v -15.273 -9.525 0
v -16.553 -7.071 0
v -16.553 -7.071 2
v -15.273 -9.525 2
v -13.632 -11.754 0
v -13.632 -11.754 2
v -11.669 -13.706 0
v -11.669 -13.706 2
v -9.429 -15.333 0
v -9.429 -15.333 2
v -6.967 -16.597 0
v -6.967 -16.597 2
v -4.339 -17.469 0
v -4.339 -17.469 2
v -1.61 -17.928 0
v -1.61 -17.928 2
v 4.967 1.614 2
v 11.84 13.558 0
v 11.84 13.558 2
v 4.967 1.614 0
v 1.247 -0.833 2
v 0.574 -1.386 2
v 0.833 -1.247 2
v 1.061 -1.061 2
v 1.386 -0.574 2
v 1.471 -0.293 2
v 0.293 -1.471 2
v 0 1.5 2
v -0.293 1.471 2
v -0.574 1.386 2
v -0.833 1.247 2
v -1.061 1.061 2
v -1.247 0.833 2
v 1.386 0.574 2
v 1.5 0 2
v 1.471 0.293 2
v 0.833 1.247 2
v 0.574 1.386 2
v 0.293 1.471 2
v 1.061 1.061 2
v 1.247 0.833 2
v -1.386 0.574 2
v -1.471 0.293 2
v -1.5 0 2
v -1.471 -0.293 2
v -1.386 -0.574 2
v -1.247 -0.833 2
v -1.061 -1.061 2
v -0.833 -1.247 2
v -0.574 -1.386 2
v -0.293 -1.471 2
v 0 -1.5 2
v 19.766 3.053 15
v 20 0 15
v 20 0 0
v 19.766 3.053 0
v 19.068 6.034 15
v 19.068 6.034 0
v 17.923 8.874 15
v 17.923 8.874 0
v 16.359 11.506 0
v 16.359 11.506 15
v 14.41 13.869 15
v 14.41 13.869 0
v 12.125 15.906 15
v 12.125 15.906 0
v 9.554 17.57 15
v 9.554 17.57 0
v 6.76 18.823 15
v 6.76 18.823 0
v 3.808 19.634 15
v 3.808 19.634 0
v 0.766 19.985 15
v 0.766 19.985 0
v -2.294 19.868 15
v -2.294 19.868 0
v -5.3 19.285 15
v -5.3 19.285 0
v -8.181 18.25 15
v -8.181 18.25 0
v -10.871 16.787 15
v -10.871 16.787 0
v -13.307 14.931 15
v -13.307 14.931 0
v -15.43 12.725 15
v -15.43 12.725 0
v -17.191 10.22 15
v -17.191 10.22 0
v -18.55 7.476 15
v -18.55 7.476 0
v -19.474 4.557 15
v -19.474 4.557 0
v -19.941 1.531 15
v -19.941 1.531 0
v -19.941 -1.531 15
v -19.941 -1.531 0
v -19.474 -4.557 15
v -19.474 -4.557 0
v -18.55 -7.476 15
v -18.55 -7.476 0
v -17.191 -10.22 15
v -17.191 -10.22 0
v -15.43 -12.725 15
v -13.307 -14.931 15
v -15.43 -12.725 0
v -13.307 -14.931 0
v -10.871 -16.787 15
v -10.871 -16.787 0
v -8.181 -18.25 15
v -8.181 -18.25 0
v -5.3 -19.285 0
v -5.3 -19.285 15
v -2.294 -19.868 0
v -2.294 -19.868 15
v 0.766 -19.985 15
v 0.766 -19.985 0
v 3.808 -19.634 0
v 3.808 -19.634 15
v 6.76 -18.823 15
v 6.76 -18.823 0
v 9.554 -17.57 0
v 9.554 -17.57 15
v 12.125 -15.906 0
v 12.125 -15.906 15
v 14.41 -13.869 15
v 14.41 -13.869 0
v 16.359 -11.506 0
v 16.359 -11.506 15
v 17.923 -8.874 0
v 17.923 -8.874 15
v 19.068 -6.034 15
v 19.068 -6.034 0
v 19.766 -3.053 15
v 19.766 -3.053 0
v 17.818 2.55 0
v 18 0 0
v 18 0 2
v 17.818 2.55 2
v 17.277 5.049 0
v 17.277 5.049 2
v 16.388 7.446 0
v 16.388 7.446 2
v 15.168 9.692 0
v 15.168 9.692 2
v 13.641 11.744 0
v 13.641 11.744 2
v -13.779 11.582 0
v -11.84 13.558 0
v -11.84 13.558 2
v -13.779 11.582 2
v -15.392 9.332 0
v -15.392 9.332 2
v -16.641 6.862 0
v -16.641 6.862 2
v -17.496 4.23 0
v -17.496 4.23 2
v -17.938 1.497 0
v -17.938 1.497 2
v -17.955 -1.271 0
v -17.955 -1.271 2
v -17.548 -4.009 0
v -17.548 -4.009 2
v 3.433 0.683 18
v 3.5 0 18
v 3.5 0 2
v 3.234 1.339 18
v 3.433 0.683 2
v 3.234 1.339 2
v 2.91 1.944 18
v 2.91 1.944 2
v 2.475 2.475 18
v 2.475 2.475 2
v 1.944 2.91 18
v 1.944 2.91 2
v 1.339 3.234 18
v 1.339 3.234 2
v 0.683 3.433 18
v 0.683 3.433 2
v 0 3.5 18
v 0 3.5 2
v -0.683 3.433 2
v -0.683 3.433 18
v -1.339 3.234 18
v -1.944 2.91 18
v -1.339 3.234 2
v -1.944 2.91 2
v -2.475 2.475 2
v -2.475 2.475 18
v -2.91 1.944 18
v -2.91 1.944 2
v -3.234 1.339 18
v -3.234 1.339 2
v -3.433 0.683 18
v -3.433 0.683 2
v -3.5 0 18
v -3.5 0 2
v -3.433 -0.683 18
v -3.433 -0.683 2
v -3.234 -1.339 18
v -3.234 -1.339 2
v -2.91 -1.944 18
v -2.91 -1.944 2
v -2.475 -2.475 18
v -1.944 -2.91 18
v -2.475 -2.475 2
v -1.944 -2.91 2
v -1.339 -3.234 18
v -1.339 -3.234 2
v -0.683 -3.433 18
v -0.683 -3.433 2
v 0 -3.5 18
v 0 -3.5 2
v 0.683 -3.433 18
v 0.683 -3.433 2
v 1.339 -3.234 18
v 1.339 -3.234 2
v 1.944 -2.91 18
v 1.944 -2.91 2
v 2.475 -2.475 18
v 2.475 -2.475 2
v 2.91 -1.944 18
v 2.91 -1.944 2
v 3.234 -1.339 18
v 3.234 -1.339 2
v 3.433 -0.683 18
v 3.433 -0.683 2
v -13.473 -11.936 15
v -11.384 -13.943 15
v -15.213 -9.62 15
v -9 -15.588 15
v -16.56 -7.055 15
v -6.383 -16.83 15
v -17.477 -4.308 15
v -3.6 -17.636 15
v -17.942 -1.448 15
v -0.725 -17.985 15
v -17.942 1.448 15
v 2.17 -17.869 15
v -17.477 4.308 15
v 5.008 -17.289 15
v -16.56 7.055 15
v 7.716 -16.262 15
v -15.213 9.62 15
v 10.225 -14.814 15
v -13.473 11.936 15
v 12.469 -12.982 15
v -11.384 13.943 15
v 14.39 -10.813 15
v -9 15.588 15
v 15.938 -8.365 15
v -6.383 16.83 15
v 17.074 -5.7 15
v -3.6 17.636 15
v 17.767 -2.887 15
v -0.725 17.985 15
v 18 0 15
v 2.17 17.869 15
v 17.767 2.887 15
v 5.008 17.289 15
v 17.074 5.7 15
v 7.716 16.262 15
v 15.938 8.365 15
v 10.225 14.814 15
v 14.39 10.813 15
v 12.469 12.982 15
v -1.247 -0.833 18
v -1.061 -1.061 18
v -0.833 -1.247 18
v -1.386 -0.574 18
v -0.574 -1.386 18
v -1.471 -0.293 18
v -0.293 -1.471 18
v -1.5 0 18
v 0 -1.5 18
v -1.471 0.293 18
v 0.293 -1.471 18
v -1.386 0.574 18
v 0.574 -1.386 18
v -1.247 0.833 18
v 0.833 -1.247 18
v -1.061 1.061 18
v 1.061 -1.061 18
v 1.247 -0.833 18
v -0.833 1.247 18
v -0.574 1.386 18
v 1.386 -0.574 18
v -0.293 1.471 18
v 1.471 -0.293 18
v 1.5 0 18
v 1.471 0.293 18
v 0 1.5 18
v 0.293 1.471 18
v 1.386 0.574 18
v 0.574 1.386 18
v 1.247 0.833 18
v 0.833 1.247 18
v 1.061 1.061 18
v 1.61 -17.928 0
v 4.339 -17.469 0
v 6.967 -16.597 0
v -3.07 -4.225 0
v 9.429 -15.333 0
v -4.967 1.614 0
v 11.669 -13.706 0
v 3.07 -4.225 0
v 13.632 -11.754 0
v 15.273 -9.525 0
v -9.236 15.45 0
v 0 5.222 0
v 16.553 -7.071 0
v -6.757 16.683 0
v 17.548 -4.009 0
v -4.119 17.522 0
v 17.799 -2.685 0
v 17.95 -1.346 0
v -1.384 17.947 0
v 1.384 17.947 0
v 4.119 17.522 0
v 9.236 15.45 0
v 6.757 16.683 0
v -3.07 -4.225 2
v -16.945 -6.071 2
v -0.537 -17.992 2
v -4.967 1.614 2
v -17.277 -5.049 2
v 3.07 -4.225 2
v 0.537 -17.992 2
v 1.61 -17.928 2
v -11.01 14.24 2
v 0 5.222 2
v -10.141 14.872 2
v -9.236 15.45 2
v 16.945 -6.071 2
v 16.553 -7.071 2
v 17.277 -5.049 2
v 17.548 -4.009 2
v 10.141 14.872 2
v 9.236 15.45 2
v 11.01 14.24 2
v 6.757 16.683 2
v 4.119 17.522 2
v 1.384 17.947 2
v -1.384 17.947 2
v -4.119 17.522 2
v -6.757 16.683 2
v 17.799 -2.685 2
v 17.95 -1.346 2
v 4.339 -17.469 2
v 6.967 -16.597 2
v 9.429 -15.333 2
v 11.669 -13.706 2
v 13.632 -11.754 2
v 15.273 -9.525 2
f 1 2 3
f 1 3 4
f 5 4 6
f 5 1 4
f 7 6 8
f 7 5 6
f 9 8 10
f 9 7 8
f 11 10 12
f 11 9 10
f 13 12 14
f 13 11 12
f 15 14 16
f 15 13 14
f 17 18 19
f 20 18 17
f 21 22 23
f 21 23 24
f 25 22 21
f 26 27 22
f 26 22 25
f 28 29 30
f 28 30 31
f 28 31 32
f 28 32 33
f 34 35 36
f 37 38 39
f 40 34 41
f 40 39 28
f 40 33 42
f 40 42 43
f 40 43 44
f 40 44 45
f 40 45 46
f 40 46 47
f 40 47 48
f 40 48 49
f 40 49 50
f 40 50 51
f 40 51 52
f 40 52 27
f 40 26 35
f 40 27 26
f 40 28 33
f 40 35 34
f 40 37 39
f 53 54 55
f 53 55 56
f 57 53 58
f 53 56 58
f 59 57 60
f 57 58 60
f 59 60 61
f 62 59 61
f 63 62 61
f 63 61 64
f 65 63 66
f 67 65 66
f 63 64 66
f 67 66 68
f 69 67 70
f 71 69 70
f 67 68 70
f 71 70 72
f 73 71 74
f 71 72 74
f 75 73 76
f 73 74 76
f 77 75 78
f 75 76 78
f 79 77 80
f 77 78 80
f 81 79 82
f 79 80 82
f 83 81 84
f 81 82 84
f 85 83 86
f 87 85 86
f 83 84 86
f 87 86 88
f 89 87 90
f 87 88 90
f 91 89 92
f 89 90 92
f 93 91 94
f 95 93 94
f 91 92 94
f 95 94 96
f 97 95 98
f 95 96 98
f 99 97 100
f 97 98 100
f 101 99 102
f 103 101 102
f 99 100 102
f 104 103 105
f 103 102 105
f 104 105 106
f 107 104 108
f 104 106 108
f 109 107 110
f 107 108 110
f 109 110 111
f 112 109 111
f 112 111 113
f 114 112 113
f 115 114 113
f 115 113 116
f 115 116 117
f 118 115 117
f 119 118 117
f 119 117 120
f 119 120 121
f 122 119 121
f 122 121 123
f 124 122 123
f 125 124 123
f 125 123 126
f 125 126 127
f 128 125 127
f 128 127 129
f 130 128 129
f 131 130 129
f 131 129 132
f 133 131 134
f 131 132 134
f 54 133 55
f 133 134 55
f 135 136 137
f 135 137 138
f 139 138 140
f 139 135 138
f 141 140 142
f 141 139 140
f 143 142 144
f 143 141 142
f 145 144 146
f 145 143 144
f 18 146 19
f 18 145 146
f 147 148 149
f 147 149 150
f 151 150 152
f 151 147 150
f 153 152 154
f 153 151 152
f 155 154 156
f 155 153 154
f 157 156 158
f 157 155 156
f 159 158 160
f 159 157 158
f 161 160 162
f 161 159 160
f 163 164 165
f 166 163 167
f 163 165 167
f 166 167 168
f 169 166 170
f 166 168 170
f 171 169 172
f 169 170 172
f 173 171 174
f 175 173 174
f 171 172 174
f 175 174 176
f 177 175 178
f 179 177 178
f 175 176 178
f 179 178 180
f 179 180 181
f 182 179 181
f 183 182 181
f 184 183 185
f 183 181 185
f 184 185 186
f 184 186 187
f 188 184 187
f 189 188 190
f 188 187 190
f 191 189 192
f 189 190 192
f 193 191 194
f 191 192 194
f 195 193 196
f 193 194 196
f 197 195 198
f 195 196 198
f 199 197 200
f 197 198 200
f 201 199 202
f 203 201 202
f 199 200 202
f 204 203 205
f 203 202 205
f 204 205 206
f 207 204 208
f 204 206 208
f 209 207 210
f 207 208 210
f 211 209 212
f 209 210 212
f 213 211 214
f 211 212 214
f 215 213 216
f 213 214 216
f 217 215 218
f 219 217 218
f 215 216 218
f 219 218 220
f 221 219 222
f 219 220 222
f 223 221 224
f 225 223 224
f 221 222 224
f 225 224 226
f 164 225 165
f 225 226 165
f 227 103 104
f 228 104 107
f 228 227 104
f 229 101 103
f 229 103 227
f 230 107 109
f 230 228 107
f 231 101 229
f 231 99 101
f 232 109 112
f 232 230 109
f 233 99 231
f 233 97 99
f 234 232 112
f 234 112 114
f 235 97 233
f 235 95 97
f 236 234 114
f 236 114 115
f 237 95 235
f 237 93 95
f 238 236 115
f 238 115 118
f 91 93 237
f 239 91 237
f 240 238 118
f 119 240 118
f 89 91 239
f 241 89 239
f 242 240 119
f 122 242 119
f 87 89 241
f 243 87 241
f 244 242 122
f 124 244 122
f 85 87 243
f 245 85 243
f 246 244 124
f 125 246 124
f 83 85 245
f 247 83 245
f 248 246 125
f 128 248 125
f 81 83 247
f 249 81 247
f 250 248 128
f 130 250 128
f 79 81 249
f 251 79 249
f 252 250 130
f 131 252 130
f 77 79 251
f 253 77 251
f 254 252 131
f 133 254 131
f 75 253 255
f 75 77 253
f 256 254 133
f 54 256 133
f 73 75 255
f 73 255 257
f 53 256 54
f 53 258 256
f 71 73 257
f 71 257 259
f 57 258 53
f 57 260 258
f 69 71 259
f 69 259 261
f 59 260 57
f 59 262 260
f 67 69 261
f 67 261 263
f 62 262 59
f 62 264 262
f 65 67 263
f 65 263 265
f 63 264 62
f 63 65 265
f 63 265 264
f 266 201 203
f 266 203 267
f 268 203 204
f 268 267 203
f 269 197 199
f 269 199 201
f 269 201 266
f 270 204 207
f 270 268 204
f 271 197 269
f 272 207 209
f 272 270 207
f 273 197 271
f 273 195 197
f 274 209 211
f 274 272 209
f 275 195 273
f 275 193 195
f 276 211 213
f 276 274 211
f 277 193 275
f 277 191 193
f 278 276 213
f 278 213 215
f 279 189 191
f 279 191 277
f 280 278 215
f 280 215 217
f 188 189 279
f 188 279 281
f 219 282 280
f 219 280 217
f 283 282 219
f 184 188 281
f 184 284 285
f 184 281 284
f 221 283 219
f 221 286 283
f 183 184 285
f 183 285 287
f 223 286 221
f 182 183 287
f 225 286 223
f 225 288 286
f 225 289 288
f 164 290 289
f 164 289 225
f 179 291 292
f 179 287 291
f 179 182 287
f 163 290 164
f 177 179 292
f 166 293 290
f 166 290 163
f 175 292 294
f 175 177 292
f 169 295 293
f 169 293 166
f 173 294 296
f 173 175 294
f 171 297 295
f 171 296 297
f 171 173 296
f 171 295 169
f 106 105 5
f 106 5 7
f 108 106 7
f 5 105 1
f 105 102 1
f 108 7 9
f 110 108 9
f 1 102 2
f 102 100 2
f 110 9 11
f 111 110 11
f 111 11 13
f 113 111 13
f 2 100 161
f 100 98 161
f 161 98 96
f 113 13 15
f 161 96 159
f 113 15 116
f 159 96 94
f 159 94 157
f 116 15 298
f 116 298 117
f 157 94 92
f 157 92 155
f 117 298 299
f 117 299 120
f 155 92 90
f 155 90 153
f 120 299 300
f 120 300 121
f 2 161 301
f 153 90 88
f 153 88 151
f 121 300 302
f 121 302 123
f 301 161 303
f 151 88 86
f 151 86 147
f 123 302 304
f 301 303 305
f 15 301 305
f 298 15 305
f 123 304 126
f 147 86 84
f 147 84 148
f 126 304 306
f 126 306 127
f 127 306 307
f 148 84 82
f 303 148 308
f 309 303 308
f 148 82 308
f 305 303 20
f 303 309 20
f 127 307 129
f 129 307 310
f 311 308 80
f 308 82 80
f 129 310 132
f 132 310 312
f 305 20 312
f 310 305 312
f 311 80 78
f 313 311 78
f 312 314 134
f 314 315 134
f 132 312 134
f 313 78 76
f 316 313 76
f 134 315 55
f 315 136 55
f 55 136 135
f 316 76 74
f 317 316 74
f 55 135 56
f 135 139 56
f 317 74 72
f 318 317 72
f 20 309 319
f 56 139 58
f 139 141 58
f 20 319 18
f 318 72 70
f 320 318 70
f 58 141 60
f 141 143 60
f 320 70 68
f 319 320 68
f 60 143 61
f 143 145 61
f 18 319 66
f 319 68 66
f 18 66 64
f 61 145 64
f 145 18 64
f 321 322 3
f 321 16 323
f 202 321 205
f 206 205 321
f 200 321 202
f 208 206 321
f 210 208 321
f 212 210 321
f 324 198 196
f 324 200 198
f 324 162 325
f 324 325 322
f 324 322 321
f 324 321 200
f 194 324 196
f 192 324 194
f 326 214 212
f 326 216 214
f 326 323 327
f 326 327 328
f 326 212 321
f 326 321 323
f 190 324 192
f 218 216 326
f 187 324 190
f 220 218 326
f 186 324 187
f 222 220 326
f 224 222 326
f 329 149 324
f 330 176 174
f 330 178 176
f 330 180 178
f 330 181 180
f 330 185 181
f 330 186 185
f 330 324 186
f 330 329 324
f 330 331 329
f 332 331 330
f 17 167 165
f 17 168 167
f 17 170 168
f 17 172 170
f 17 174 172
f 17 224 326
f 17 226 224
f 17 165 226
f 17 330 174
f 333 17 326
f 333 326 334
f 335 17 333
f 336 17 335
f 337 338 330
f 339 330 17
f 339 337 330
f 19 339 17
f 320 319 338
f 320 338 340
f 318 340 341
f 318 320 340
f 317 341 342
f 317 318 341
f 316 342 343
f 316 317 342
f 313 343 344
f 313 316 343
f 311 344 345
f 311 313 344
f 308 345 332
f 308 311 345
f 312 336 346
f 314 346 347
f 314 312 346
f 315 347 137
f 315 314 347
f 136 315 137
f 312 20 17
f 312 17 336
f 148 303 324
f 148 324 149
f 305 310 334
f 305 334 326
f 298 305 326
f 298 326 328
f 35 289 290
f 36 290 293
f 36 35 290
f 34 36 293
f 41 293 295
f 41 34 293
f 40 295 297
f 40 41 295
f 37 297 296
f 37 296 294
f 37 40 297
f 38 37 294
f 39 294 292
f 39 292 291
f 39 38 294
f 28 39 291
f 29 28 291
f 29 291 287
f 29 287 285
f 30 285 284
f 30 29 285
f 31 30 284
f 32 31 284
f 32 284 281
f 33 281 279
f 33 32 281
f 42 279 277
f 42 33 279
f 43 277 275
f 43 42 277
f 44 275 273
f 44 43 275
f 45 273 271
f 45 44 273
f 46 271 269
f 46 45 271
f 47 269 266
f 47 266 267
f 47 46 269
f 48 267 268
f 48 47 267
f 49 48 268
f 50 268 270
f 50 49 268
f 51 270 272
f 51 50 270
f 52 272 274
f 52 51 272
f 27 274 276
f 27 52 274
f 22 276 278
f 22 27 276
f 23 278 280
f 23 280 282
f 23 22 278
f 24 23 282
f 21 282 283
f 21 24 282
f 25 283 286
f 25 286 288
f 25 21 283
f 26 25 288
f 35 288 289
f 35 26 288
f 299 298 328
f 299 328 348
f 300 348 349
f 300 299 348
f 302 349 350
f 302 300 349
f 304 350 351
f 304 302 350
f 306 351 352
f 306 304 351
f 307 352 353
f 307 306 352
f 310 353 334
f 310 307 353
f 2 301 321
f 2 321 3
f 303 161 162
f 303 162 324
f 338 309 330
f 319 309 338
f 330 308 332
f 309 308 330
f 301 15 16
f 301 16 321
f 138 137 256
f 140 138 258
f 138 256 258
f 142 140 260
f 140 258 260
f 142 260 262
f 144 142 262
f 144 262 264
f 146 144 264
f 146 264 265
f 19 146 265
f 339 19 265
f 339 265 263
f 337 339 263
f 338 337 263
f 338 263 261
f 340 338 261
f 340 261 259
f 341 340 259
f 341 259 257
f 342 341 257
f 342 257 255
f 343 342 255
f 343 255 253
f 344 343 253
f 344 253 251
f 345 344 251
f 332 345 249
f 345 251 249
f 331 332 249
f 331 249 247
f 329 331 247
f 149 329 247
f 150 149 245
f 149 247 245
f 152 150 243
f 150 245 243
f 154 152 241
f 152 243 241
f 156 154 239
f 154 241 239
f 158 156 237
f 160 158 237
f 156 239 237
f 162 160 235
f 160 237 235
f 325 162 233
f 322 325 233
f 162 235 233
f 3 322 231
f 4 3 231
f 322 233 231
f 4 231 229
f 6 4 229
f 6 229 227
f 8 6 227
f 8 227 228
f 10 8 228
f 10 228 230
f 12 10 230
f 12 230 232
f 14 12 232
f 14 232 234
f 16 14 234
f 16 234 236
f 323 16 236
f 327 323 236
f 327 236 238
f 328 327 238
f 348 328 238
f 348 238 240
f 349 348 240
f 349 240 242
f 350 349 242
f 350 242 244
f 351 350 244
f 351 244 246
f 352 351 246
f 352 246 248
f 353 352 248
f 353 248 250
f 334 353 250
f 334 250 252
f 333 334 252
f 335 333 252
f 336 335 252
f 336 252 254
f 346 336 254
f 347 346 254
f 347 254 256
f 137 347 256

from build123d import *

# Parameters (mm, degrees)
F0_R     = 20
F1_DEPTH = 15
F2_R     = 18
F3_DEPTH = 13
F5_R     = 3.5
F5_R_2   = 1.5
F6_DEPTH = 16
F8_DEPTH = 2


with BuildPart() as f1:
    # F0 (on Top) → F1 (new body)
    with BuildSketch(Plane.XY):
        Circle(F0_R)
    extrude(amount=F1_DEPTH)

    # F2 (on face) → F3 (cut)
    with BuildSketch(Plane.XY.offset(15)):
        Circle(F2_R)
    extrude(amount=-F3_DEPTH, mode=Mode.SUBTRACT)

    # F5 (on face) → F6 (join)
    with BuildSketch(Plane.XY.offset(2)):
        Circle(F5_R)
        Circle(F5_R_2, mode=Mode.SUBTRACT)
    extrude(amount=F6_DEPTH)

    # F7 (on Top) → F8 (cut)
    with BuildSketch(Plane.XY):
        with BuildLine():
            ThreePointArc((-16.5530215172, -7.0708895234), (-10.5801345413, -14.5623058987), (-1.6096506002, -17.9278840064))
            Line((-1.6096506002, -17.9278840064), (-3.0696488791, -4.2250092194))
            Line((-3.0696488791, -4.2250092194), (-16.5530215172, -7.0708895234))
        make_face()
        with BuildLine():
            ThreePointArc((1.6096506002, -17.9278840064), (10.5801345413, -14.5623058987), (16.5530215172, -7.0708895234))
            Line((16.5530215172, -7.0708895234), (3.0696488791, -4.2250092194))
            Line((3.0696488791, -4.2250092194), (1.6096506002, -17.9278840064))
        make_face()
        with BuildLine():
            ThreePointArc((17.5478402981, -4.0091521389), (17.8866028827, -2.0172846396), (18, 0))
            ThreePointArc((18, 0), (16.3877949898, 7.4458159641), (11.8399805143, 13.5578339502))
            Line((11.8399805143, 13.5578339502), (4.9667962199, 1.613809919))
            Line((4.9667962199, 1.613809919), (17.5478402981, -4.0091521389))
        make_face()
        with BuildLine():
            Line((0, 5.2223986007), (9.2355111332, 15.4500917184))
            ThreePointArc((9.2355111332, 15.4500917184), (0, 18), (-9.2355111332, 15.4500917184))
            Line((-9.2355111332, 15.4500917184), (0, 5.2223986007))
        make_face()
        with BuildLine():
            Line((-4.9667962199, 1.613809919), (-11.8399805143, 13.5578339502))
            ThreePointArc((-11.8399805143, 13.5578339502), (-17.1190172933, 5.5623058987), (-17.5478402981, -4.0091521389))
            Line((-17.5478402981, -4.0091521389), (-4.9667962199, 1.613809919))
        make_face()
    extrude(amount=F8_DEPTH, mode=Mode.SUBTRACT)


solid = f1.part
